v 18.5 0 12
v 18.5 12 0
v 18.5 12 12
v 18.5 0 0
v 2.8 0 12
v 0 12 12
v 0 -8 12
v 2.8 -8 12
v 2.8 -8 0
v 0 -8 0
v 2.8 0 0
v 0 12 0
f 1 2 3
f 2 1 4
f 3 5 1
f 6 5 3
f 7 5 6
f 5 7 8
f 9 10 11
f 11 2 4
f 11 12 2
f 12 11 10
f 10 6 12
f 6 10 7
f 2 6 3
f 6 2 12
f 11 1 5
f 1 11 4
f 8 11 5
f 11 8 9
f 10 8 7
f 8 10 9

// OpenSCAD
// rack box depth stopper
// @author Ilya Protasov

/* [Base] */
full_depth = 21;
width = 12;
height = 12;
damping_pad_thickness = 2.5;
lock_thickness = 2.8; //0.4 * 7
lock_height = 8;


/* [Hidden]  */
depth_without_pad = full_depth - damping_pad_thickness;


module stopper() {
    // item lay on the side
    cube([depth_without_pad, height, width], false);
    // lock
    color("green") 
        translate([0, -lock_height, 0])
            cube([lock_thickness, lock_height, width], false);
    
    // show pad for debug only
    translate([depth_without_pad, 0, 0]) 
        %cube([damping_pad_thickness, height, width], false);
}

stopper();
